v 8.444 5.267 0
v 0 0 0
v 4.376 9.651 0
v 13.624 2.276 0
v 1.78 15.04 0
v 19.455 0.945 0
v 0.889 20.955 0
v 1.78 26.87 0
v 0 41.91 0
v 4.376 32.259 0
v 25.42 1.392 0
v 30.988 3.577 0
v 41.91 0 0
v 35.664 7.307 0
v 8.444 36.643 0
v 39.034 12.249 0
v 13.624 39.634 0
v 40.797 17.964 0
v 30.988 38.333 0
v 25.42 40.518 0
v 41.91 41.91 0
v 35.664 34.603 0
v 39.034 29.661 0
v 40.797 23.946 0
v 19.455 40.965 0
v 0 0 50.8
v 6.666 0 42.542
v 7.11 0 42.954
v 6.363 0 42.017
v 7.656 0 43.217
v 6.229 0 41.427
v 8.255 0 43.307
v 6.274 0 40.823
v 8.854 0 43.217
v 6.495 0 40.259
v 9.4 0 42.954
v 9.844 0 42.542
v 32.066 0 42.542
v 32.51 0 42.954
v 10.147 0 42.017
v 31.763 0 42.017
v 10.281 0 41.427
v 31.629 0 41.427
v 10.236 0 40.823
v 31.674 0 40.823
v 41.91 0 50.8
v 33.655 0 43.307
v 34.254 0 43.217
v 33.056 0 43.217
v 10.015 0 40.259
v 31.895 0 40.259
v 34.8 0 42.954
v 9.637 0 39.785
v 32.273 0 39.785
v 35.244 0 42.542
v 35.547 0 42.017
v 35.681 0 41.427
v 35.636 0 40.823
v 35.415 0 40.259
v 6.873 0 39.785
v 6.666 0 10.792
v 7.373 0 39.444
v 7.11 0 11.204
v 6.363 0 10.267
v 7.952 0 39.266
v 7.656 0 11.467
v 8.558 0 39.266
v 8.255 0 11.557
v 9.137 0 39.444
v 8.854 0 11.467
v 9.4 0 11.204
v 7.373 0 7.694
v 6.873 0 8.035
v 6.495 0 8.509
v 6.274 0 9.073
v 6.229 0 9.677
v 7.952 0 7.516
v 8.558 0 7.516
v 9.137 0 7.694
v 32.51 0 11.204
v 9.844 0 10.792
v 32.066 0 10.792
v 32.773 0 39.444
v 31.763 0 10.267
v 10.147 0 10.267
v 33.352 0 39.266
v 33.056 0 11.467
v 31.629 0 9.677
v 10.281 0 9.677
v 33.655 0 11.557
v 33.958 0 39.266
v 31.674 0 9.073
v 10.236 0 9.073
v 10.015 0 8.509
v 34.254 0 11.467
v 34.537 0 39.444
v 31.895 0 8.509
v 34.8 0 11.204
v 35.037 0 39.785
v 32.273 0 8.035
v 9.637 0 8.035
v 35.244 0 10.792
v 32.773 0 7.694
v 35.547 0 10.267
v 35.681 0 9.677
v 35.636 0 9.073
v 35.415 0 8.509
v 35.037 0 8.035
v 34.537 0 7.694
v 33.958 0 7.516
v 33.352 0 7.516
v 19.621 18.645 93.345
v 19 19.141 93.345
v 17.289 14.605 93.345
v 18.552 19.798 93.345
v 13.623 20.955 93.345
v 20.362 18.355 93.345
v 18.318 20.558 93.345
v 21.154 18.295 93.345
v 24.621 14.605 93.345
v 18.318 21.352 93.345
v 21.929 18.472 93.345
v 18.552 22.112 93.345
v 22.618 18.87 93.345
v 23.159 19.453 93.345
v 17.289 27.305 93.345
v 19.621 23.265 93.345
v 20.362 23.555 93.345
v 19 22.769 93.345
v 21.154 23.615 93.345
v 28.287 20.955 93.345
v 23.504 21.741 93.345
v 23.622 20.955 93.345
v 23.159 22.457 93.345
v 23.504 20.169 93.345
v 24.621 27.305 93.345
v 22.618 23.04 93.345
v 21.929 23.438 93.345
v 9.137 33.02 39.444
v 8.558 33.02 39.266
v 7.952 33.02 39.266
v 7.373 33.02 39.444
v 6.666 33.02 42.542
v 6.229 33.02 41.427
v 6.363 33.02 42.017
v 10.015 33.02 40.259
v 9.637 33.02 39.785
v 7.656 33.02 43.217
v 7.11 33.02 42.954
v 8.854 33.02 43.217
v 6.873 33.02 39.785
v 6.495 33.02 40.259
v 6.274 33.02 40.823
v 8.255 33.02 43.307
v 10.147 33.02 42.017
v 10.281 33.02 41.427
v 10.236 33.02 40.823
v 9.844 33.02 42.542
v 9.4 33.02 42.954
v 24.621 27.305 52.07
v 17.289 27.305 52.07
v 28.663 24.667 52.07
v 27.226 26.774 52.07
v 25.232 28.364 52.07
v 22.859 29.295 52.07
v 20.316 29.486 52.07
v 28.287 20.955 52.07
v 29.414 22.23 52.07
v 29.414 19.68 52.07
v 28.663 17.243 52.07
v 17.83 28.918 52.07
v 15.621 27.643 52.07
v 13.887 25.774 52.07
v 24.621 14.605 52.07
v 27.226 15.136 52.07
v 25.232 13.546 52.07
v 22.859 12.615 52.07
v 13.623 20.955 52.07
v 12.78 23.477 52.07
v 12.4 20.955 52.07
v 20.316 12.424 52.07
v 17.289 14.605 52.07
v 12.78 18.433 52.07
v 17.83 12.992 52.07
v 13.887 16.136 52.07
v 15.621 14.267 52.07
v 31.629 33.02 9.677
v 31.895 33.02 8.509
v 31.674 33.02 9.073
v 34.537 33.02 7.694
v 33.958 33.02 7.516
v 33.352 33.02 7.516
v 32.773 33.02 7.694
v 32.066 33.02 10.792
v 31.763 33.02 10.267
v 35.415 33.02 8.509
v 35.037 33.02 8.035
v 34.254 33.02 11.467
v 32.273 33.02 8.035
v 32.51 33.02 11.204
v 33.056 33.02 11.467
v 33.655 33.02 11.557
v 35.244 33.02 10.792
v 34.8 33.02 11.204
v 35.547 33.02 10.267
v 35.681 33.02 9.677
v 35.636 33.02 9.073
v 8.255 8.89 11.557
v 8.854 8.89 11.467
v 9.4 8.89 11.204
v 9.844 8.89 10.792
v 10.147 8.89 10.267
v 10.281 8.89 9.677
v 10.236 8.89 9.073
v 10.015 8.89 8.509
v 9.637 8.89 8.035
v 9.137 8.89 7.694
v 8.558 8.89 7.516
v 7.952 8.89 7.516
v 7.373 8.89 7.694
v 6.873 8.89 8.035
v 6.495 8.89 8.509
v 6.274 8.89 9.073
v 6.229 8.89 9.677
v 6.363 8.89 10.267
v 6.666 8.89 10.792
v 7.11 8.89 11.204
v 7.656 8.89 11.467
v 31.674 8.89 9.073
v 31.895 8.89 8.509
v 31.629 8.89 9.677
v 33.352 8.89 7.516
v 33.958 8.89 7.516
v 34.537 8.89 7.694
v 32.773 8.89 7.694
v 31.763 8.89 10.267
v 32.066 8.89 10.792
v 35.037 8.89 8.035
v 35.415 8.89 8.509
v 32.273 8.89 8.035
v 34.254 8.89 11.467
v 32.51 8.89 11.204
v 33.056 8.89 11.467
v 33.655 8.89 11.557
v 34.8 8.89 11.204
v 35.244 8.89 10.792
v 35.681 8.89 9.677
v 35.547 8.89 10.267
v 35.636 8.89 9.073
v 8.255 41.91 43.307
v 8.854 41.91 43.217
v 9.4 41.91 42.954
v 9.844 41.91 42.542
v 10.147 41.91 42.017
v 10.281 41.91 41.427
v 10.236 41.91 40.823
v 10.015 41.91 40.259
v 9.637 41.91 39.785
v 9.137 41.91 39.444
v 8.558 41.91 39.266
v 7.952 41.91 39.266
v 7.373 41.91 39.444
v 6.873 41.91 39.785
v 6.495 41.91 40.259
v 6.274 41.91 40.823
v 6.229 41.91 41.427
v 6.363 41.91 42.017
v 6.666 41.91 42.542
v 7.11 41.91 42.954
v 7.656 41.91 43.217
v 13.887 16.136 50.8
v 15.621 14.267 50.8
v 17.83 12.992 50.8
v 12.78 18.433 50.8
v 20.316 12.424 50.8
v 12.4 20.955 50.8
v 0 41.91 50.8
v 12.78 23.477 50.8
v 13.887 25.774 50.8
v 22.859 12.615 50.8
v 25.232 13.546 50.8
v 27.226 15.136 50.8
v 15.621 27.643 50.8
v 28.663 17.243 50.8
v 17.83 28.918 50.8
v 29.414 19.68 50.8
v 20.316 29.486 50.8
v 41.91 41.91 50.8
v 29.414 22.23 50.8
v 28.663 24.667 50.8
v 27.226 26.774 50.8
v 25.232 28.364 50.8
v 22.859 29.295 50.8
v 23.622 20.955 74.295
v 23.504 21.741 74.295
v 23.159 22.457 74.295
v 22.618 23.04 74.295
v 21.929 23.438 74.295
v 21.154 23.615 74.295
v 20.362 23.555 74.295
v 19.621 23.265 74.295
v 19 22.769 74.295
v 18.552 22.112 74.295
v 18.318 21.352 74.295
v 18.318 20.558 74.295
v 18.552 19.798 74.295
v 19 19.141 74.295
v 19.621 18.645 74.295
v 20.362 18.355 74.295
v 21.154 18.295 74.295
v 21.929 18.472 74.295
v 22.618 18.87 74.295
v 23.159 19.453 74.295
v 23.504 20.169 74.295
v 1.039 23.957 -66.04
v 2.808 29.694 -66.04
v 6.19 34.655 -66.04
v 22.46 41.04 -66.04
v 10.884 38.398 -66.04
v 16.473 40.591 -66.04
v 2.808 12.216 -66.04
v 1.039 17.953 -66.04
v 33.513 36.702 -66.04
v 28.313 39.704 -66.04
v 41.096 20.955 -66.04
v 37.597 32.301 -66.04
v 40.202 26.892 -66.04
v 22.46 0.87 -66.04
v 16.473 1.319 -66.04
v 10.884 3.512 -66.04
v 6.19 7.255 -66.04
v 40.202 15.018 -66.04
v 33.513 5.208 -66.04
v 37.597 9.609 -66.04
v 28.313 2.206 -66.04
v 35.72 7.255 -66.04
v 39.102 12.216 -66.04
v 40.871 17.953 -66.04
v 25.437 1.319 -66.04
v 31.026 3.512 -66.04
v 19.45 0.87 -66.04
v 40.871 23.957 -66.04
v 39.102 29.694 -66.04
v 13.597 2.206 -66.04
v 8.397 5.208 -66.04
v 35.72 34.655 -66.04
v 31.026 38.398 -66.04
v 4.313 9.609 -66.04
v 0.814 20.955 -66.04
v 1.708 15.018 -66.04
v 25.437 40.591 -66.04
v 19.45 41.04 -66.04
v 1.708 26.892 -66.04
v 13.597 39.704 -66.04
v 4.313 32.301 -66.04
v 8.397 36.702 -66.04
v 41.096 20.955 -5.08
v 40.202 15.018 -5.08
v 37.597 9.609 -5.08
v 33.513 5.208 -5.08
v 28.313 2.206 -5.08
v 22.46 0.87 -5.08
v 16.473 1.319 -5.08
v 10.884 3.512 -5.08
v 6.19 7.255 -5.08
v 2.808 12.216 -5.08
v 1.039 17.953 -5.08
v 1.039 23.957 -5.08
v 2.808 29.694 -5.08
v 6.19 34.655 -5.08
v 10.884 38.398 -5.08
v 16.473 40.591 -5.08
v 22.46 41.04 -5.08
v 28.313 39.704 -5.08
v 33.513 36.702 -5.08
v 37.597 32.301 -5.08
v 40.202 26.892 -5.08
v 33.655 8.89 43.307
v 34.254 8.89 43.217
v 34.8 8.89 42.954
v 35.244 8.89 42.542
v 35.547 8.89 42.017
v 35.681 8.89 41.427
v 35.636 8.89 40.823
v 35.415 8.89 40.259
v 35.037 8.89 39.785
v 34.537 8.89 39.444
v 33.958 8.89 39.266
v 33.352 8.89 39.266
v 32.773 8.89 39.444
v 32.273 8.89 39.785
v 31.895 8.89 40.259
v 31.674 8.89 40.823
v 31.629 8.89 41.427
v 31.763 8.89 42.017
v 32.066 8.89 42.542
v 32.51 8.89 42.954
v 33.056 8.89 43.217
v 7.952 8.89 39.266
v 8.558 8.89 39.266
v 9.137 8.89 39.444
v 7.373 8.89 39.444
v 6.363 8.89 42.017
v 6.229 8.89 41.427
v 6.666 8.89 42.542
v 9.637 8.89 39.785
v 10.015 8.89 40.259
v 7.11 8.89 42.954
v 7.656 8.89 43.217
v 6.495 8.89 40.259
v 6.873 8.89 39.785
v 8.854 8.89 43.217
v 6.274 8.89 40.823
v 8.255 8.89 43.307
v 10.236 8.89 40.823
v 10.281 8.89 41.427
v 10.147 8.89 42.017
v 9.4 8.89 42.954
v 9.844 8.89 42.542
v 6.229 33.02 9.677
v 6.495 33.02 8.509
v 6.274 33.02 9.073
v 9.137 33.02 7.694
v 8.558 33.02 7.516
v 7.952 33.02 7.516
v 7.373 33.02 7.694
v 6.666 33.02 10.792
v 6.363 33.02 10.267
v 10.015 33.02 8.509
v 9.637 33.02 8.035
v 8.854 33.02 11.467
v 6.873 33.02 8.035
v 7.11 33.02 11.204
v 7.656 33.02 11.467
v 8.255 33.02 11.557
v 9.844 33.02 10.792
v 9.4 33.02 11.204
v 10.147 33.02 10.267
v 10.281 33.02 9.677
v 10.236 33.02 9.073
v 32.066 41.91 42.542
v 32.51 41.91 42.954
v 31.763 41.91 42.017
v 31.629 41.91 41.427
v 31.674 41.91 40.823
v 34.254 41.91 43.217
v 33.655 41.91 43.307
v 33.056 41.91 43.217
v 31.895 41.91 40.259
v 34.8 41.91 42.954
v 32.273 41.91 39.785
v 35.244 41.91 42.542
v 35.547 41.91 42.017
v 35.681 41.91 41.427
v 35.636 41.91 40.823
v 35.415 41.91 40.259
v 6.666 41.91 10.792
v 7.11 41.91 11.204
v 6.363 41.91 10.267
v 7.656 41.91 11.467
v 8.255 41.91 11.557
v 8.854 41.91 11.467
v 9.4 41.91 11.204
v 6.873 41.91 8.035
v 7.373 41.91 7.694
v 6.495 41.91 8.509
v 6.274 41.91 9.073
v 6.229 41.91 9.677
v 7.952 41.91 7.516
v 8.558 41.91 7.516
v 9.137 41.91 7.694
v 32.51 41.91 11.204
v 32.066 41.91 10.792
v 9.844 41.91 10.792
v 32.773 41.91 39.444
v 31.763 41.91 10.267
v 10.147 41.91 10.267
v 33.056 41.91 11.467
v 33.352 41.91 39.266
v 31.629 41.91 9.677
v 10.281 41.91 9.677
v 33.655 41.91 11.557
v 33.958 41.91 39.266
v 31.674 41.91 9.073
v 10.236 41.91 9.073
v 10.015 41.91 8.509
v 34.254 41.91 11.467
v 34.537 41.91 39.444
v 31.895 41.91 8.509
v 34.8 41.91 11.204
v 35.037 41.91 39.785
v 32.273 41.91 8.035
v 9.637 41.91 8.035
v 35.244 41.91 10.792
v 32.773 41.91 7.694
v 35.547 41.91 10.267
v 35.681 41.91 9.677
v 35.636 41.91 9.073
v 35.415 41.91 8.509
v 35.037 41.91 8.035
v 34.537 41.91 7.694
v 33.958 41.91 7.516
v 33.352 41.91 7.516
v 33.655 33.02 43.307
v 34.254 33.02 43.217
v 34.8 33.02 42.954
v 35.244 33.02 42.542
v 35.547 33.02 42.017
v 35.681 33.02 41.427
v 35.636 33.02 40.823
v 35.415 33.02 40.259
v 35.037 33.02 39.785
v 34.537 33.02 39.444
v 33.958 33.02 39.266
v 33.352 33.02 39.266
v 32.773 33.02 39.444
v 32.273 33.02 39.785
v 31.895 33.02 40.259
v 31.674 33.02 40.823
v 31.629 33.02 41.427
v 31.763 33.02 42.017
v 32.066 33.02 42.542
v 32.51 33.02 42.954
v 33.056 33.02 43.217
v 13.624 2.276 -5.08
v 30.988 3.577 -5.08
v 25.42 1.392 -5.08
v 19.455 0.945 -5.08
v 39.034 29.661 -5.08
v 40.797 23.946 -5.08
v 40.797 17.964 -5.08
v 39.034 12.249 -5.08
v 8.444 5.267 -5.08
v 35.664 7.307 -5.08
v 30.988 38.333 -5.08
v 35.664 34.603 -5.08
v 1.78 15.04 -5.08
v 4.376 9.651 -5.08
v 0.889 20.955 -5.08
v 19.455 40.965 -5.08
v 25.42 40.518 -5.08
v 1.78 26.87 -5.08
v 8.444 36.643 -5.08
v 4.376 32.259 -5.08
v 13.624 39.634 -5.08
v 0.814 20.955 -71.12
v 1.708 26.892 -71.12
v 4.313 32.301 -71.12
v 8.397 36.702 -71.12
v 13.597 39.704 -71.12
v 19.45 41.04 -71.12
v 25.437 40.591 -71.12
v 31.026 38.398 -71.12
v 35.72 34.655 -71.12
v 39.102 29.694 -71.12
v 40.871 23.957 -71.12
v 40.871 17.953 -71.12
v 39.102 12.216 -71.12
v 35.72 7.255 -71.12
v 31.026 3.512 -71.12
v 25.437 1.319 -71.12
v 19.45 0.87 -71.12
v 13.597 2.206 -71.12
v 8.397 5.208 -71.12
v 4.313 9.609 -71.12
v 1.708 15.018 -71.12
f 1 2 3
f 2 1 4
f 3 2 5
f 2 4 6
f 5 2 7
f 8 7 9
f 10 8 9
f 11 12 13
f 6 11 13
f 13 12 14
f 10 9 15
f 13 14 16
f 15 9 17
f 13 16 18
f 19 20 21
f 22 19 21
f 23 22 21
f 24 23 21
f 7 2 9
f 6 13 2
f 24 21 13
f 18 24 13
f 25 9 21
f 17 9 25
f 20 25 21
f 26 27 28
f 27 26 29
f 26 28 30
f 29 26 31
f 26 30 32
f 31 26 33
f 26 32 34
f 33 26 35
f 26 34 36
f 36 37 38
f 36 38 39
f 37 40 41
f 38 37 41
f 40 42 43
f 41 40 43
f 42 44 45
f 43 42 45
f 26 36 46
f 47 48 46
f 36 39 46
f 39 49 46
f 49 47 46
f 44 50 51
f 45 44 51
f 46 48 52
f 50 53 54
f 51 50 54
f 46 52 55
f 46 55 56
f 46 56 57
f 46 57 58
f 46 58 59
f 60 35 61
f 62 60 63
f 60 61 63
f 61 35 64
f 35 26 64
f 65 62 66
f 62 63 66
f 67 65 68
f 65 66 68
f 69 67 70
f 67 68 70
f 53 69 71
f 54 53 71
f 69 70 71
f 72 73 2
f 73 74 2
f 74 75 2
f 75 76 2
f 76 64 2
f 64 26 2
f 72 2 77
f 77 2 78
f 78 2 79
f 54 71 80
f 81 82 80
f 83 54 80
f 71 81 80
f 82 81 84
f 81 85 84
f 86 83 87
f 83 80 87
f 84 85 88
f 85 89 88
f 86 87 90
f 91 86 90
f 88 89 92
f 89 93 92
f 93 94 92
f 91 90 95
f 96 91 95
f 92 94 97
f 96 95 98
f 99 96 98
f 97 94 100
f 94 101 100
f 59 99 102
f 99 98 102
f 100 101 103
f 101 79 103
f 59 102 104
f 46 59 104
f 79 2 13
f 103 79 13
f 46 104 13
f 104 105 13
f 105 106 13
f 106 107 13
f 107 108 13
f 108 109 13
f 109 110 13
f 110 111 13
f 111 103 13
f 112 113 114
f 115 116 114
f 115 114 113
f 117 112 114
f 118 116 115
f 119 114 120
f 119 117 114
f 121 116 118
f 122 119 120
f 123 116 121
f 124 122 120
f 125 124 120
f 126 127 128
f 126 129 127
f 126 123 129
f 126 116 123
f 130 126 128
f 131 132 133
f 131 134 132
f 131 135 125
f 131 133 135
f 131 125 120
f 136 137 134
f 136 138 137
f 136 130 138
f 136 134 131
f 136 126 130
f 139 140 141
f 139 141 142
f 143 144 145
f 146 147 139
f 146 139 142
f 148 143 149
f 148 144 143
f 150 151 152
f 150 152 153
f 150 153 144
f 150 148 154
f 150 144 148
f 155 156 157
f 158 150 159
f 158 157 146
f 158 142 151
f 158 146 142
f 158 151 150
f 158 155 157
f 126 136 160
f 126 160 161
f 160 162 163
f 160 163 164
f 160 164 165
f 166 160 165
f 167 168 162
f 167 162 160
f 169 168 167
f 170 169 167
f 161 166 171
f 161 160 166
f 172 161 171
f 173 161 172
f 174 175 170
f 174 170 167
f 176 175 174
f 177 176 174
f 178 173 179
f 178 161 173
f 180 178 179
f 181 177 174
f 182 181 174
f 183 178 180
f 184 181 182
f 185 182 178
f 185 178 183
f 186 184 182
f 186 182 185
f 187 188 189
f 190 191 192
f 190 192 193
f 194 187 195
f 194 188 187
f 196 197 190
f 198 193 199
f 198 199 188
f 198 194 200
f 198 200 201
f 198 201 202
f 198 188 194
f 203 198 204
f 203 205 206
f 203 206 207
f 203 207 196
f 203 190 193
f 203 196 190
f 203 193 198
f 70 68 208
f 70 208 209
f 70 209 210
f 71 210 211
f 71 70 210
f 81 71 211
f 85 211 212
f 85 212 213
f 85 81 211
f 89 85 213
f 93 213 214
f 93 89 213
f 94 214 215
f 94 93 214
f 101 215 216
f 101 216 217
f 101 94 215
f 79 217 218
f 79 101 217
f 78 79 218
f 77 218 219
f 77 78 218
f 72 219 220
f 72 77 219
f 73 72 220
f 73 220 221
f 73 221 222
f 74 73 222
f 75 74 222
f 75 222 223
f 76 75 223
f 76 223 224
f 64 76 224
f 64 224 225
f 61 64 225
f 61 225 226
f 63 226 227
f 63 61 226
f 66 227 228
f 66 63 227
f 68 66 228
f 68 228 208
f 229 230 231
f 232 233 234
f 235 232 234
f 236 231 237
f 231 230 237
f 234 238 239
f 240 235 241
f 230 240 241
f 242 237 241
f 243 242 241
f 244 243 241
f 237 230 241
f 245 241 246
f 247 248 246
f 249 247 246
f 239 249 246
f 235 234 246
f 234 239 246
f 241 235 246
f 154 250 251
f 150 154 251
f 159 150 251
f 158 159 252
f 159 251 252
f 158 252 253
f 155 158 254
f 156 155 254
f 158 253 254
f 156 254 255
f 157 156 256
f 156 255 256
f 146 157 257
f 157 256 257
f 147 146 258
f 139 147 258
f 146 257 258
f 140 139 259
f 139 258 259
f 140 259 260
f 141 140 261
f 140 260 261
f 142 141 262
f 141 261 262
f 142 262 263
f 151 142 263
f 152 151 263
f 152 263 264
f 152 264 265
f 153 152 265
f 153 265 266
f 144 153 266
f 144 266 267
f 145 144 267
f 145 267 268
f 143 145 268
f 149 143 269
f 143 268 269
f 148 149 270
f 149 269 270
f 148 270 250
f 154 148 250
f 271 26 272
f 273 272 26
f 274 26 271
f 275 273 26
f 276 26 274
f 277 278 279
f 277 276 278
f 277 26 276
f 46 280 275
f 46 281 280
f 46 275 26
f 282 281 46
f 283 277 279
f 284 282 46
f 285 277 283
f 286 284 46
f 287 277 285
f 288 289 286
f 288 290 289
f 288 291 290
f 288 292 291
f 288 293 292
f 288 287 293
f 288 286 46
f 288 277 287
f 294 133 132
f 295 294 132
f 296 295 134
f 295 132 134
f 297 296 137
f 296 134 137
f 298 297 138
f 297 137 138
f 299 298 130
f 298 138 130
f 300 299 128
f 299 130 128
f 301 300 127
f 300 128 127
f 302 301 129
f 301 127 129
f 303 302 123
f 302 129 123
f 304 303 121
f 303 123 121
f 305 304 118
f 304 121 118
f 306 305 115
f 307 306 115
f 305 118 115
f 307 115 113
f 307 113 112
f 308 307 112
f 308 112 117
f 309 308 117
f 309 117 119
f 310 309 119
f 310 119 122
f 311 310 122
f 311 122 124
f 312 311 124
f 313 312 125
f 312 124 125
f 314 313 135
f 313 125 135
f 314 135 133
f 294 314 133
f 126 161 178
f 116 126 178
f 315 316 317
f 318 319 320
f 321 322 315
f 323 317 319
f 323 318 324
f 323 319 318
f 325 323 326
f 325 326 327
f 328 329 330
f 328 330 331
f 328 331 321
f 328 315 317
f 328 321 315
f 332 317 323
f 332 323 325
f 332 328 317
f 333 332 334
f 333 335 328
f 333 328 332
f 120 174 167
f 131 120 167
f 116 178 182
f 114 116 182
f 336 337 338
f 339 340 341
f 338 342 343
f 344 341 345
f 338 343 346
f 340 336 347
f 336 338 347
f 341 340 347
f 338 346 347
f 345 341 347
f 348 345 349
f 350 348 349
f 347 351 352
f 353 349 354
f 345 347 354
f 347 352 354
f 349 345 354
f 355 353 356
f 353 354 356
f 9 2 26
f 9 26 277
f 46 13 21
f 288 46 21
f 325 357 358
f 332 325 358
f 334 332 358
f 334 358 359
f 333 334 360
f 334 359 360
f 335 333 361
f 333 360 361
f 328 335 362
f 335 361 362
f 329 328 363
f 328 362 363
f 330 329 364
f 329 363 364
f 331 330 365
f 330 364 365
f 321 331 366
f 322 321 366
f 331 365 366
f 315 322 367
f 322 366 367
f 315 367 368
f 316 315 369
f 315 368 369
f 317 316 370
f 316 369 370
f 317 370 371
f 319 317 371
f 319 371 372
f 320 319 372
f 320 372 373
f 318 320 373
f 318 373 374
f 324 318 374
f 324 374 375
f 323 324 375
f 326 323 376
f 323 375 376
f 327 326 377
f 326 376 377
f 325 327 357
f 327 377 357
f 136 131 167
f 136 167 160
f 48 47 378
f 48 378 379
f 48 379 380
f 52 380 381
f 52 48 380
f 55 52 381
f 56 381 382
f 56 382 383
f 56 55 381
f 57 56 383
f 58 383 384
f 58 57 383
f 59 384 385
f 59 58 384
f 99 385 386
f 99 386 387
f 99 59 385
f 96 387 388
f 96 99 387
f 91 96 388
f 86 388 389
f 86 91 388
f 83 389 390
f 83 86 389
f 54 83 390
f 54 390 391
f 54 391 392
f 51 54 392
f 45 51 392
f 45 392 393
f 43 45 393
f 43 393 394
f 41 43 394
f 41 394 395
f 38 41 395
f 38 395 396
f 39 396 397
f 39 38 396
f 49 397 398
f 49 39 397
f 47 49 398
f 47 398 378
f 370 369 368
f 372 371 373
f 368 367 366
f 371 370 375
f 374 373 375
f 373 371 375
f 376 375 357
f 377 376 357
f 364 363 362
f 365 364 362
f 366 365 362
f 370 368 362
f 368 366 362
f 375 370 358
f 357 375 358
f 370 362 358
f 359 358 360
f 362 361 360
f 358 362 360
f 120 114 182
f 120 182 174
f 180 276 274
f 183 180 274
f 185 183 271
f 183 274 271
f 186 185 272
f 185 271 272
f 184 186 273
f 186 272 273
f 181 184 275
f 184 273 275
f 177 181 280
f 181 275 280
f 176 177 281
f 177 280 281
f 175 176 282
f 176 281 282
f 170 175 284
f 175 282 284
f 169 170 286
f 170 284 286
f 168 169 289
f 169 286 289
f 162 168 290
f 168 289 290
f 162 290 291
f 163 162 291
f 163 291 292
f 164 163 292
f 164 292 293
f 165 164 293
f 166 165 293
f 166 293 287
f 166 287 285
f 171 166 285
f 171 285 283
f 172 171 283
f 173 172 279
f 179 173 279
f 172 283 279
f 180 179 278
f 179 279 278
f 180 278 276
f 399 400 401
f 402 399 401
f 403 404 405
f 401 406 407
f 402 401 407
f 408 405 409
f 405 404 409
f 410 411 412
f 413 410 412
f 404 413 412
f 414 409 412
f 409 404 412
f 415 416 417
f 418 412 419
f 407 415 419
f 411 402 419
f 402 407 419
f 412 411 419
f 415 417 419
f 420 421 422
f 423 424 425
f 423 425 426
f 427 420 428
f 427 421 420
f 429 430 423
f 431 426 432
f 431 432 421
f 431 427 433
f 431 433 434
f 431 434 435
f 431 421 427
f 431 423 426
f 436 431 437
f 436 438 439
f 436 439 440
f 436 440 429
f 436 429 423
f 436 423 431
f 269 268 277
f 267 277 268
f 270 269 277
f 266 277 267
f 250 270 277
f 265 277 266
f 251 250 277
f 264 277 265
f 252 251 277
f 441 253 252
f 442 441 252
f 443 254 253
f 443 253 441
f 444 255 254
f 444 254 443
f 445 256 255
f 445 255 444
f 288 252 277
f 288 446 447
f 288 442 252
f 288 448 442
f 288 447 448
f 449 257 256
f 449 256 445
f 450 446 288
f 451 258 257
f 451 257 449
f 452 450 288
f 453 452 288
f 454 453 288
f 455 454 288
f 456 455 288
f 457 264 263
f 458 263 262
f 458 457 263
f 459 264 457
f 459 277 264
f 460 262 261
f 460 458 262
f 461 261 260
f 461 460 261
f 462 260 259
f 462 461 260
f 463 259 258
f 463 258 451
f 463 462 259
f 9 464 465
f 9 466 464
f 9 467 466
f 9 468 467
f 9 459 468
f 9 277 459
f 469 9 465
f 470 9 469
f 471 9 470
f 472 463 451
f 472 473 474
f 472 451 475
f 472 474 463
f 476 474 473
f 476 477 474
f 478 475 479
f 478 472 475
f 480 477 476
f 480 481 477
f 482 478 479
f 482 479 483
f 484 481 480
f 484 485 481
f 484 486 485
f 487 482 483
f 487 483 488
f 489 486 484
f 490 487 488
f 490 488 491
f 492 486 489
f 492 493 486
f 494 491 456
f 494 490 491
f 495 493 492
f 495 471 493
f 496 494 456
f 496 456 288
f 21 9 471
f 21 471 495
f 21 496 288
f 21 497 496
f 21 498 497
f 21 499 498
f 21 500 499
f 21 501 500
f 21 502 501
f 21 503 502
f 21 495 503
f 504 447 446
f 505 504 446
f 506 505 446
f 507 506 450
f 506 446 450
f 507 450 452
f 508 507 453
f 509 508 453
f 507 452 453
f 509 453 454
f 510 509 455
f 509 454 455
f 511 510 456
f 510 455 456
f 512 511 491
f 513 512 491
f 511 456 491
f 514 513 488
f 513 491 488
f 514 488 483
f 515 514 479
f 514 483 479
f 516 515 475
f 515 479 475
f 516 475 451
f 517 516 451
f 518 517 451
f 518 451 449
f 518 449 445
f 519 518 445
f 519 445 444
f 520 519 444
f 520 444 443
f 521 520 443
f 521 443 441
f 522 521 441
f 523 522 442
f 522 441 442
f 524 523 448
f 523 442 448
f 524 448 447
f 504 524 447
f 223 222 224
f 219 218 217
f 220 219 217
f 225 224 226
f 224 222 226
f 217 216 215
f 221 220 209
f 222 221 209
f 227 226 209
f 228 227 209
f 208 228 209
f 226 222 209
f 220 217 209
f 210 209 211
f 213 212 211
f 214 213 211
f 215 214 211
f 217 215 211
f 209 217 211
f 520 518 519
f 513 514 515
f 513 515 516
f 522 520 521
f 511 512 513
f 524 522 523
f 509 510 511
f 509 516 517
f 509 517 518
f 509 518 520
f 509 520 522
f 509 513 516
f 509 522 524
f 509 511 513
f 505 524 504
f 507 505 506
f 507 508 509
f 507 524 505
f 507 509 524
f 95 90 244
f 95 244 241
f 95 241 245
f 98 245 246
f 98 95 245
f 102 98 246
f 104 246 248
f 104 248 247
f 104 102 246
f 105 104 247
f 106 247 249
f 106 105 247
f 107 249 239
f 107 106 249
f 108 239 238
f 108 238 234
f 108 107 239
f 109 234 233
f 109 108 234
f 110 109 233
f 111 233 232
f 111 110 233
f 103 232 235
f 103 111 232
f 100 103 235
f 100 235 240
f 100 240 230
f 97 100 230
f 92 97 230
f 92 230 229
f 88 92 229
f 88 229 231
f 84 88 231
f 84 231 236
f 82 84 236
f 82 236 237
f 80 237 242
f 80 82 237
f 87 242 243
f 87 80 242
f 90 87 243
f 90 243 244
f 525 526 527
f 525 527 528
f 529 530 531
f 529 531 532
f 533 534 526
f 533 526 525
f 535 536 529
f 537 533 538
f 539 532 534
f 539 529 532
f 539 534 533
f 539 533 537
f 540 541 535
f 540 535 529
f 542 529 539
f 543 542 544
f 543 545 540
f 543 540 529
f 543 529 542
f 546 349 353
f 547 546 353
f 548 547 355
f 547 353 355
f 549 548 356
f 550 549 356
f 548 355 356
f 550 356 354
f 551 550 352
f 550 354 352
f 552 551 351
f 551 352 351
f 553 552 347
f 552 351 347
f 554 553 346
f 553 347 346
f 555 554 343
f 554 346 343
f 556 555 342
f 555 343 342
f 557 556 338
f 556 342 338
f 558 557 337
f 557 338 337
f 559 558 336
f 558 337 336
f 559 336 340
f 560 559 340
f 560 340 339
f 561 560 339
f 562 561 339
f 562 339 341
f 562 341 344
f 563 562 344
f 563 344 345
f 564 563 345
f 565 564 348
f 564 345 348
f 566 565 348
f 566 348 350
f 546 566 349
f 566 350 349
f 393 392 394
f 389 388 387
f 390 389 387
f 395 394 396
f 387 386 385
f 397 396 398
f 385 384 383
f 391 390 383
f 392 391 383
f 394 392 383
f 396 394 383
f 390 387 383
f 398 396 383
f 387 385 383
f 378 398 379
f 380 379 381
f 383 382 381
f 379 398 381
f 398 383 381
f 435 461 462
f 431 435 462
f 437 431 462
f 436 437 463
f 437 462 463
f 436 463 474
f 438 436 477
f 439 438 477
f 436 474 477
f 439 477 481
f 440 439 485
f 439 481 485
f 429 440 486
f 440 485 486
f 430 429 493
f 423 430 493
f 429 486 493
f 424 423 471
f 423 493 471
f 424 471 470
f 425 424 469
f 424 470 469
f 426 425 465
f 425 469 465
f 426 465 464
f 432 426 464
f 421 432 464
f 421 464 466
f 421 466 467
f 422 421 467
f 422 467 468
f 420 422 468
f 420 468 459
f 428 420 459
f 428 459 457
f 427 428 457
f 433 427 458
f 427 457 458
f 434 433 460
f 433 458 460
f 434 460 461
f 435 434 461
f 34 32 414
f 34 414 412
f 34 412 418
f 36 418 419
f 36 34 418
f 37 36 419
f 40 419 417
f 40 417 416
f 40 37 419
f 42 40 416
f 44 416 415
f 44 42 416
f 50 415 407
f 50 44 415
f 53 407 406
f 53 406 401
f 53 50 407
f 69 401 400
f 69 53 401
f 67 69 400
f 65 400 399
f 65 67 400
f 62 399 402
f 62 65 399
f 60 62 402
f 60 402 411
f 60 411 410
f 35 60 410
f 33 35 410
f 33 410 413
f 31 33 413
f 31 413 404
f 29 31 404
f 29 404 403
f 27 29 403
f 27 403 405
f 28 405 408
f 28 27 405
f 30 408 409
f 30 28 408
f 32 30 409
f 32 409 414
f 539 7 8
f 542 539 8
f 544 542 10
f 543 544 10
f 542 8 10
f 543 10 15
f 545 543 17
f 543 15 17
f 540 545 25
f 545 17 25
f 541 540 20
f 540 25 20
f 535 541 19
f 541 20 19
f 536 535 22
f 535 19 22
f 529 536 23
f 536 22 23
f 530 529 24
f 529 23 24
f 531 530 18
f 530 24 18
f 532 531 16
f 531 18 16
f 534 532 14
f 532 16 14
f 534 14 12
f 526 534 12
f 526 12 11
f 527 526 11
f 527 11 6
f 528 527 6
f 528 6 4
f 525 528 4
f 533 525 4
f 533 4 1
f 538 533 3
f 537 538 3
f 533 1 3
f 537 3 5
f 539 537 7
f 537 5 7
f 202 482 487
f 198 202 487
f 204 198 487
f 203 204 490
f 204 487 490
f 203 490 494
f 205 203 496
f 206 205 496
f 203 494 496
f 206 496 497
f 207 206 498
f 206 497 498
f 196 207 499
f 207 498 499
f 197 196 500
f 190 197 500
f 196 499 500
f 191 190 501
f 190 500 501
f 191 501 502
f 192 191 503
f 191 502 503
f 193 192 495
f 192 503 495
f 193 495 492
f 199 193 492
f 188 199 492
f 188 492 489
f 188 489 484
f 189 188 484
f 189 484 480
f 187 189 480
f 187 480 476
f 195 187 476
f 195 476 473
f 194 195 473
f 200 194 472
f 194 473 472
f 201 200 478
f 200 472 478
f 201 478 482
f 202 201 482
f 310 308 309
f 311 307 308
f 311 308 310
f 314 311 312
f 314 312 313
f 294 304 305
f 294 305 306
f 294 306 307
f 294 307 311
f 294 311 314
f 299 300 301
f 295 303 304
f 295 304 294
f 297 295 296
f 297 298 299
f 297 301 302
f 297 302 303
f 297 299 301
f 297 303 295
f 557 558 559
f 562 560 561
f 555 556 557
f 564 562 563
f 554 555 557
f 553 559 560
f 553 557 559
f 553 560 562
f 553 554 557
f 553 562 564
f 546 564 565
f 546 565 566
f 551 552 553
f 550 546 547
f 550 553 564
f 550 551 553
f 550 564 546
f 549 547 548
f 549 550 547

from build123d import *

# Parameters (mm, degrees)
SKETCH1_W           = 41.91
SKETCH1_H           = 41.91
BOSS_EXTRUDE1_DEPTH = 50.8
BOSS_EXTRUDE2_DEPTH = 42.545
SKETCH3_R           = 20.066
BOSS_EXTRUDE3_DEPTH = 5.08
SKETCH4_R           = 20.141371121
BOSS_EXTRUDE4_DEPTH = 60.96
SKETCH5_R           = 20.141371121
BOSS_EXTRUDE5_DEPTH = 5.08
SKETCH6_R           = 8.554692431
BOSS_EXTRUDE6_DEPTH = 1.27
SKETCH7_R           = 2.667
CUT_EXTRUDE1_DEPTH  = 19.05
SKETCH8_R           = 2.032
CUT_EXTRUDE2_DEPTH  = 8.89


with BuildPart() as part:
    # Sketch1 → Boss-Extrude1 (new body)
    with BuildSketch(Plane.XY):
        with Locations((20.955, 20.955)):
            Rectangle(SKETCH1_W, SKETCH1_H)
    extrude(amount=BOSS_EXTRUDE1_DEPTH)

    # Sketch2 → Boss-Extrude2 (add)
    with BuildSketch(Plane.XY.offset(50.8)):
        Polygon((28.287348419, 20.955), (24.621174209, 27.305), (17.288825791, 27.305), (13.622651581, 20.955), (17.288825791, 14.605), (24.621174209, 14.605), align=None)
    extrude(amount=BOSS_EXTRUDE2_DEPTH)

    # Sketch3 → Boss-Extrude3 (add)
    with BuildSketch(Plane(origin=(0, 0, 0), x_dir=(-1, 0, 0), z_dir=(0, 0, -1))):
        with Locations((-20.955, 20.955)):
            Circle(SKETCH3_R)
    extrude(amount=BOSS_EXTRUDE3_DEPTH)

    # Sketch6 → Boss-Extrude6 (add)
    with BuildSketch(Plane.XY.offset(50.8)):
        with Locations(Location((20.955, 20.955, 0), (0, 0, 180))):
            Circle(SKETCH6_R)
    extrude(amount=BOSS_EXTRUDE6_DEPTH)

    # Sketch7 → Cut-Extrude1 (cut)
    with BuildSketch(Plane.XY.offset(93.345)):
        with Locations((20.955, 20.955)):
            Circle(SKETCH7_R)
    extrude(amount=-CUT_EXTRUDE1_DEPTH, mode=Mode.SUBTRACT)

    # Sketch8 → Cut-Extrude2 (cut)
    with BuildSketch(Plane(origin=(0, 41.91, 0), x_dir=(1, 0, 0), z_dir=(0, 1, 0))):
        with Locations(Location((33.655, -9.525, 0), (0, 0, 270))):
            Circle(SKETCH8_R)
        with Locations(Location((8.255, -9.525, 0), (0, 0, 270))):
            Circle(SKETCH8_R)
        with Locations(Location((8.255, -41.275, 0), (0, 0, 270))):
            Circle(SKETCH8_R)
        with Locations(Location((33.655, -41.275, 0), (0, 0, 270))):
            Circle(SKETCH8_R)
    cut_extrude2 = extrude(amount=-CUT_EXTRUDE2_DEPTH, mode=Mode.SUBTRACT)

    # Mirror1: Cut-Extrude2 across plane
    add(cut_extrude2.mirror(Plane.ZX.offset(20.955)), mode=Mode.SUBTRACT)


with BuildPart() as body_2:
    # Sketch4 → Boss-Extrude4 (new body)
    with BuildSketch(Plane(origin=(0, 0, -5.08), x_dir=(-1, 0, 0), z_dir=(0, 0, -1))):
        with Locations(Location((-20.955, 20.955, 0), (0, 0, 180))):
            Circle(SKETCH4_R)
    extrude(amount=BOSS_EXTRUDE4_DEPTH)


with BuildPart() as body_3:
    # Sketch5 → Boss-Extrude5 (new body)
    with BuildSketch(Plane(origin=(0, 0, -66.04), x_dir=(-1, 0, 0), z_dir=(0, 0, -1))):
        with Locations((-20.955, 20.955)):
            Circle(SKETCH5_R)
    extrude(amount=BOSS_EXTRUDE5_DEPTH)


solid = Compound([part.part, body_2.part, body_3.part])
